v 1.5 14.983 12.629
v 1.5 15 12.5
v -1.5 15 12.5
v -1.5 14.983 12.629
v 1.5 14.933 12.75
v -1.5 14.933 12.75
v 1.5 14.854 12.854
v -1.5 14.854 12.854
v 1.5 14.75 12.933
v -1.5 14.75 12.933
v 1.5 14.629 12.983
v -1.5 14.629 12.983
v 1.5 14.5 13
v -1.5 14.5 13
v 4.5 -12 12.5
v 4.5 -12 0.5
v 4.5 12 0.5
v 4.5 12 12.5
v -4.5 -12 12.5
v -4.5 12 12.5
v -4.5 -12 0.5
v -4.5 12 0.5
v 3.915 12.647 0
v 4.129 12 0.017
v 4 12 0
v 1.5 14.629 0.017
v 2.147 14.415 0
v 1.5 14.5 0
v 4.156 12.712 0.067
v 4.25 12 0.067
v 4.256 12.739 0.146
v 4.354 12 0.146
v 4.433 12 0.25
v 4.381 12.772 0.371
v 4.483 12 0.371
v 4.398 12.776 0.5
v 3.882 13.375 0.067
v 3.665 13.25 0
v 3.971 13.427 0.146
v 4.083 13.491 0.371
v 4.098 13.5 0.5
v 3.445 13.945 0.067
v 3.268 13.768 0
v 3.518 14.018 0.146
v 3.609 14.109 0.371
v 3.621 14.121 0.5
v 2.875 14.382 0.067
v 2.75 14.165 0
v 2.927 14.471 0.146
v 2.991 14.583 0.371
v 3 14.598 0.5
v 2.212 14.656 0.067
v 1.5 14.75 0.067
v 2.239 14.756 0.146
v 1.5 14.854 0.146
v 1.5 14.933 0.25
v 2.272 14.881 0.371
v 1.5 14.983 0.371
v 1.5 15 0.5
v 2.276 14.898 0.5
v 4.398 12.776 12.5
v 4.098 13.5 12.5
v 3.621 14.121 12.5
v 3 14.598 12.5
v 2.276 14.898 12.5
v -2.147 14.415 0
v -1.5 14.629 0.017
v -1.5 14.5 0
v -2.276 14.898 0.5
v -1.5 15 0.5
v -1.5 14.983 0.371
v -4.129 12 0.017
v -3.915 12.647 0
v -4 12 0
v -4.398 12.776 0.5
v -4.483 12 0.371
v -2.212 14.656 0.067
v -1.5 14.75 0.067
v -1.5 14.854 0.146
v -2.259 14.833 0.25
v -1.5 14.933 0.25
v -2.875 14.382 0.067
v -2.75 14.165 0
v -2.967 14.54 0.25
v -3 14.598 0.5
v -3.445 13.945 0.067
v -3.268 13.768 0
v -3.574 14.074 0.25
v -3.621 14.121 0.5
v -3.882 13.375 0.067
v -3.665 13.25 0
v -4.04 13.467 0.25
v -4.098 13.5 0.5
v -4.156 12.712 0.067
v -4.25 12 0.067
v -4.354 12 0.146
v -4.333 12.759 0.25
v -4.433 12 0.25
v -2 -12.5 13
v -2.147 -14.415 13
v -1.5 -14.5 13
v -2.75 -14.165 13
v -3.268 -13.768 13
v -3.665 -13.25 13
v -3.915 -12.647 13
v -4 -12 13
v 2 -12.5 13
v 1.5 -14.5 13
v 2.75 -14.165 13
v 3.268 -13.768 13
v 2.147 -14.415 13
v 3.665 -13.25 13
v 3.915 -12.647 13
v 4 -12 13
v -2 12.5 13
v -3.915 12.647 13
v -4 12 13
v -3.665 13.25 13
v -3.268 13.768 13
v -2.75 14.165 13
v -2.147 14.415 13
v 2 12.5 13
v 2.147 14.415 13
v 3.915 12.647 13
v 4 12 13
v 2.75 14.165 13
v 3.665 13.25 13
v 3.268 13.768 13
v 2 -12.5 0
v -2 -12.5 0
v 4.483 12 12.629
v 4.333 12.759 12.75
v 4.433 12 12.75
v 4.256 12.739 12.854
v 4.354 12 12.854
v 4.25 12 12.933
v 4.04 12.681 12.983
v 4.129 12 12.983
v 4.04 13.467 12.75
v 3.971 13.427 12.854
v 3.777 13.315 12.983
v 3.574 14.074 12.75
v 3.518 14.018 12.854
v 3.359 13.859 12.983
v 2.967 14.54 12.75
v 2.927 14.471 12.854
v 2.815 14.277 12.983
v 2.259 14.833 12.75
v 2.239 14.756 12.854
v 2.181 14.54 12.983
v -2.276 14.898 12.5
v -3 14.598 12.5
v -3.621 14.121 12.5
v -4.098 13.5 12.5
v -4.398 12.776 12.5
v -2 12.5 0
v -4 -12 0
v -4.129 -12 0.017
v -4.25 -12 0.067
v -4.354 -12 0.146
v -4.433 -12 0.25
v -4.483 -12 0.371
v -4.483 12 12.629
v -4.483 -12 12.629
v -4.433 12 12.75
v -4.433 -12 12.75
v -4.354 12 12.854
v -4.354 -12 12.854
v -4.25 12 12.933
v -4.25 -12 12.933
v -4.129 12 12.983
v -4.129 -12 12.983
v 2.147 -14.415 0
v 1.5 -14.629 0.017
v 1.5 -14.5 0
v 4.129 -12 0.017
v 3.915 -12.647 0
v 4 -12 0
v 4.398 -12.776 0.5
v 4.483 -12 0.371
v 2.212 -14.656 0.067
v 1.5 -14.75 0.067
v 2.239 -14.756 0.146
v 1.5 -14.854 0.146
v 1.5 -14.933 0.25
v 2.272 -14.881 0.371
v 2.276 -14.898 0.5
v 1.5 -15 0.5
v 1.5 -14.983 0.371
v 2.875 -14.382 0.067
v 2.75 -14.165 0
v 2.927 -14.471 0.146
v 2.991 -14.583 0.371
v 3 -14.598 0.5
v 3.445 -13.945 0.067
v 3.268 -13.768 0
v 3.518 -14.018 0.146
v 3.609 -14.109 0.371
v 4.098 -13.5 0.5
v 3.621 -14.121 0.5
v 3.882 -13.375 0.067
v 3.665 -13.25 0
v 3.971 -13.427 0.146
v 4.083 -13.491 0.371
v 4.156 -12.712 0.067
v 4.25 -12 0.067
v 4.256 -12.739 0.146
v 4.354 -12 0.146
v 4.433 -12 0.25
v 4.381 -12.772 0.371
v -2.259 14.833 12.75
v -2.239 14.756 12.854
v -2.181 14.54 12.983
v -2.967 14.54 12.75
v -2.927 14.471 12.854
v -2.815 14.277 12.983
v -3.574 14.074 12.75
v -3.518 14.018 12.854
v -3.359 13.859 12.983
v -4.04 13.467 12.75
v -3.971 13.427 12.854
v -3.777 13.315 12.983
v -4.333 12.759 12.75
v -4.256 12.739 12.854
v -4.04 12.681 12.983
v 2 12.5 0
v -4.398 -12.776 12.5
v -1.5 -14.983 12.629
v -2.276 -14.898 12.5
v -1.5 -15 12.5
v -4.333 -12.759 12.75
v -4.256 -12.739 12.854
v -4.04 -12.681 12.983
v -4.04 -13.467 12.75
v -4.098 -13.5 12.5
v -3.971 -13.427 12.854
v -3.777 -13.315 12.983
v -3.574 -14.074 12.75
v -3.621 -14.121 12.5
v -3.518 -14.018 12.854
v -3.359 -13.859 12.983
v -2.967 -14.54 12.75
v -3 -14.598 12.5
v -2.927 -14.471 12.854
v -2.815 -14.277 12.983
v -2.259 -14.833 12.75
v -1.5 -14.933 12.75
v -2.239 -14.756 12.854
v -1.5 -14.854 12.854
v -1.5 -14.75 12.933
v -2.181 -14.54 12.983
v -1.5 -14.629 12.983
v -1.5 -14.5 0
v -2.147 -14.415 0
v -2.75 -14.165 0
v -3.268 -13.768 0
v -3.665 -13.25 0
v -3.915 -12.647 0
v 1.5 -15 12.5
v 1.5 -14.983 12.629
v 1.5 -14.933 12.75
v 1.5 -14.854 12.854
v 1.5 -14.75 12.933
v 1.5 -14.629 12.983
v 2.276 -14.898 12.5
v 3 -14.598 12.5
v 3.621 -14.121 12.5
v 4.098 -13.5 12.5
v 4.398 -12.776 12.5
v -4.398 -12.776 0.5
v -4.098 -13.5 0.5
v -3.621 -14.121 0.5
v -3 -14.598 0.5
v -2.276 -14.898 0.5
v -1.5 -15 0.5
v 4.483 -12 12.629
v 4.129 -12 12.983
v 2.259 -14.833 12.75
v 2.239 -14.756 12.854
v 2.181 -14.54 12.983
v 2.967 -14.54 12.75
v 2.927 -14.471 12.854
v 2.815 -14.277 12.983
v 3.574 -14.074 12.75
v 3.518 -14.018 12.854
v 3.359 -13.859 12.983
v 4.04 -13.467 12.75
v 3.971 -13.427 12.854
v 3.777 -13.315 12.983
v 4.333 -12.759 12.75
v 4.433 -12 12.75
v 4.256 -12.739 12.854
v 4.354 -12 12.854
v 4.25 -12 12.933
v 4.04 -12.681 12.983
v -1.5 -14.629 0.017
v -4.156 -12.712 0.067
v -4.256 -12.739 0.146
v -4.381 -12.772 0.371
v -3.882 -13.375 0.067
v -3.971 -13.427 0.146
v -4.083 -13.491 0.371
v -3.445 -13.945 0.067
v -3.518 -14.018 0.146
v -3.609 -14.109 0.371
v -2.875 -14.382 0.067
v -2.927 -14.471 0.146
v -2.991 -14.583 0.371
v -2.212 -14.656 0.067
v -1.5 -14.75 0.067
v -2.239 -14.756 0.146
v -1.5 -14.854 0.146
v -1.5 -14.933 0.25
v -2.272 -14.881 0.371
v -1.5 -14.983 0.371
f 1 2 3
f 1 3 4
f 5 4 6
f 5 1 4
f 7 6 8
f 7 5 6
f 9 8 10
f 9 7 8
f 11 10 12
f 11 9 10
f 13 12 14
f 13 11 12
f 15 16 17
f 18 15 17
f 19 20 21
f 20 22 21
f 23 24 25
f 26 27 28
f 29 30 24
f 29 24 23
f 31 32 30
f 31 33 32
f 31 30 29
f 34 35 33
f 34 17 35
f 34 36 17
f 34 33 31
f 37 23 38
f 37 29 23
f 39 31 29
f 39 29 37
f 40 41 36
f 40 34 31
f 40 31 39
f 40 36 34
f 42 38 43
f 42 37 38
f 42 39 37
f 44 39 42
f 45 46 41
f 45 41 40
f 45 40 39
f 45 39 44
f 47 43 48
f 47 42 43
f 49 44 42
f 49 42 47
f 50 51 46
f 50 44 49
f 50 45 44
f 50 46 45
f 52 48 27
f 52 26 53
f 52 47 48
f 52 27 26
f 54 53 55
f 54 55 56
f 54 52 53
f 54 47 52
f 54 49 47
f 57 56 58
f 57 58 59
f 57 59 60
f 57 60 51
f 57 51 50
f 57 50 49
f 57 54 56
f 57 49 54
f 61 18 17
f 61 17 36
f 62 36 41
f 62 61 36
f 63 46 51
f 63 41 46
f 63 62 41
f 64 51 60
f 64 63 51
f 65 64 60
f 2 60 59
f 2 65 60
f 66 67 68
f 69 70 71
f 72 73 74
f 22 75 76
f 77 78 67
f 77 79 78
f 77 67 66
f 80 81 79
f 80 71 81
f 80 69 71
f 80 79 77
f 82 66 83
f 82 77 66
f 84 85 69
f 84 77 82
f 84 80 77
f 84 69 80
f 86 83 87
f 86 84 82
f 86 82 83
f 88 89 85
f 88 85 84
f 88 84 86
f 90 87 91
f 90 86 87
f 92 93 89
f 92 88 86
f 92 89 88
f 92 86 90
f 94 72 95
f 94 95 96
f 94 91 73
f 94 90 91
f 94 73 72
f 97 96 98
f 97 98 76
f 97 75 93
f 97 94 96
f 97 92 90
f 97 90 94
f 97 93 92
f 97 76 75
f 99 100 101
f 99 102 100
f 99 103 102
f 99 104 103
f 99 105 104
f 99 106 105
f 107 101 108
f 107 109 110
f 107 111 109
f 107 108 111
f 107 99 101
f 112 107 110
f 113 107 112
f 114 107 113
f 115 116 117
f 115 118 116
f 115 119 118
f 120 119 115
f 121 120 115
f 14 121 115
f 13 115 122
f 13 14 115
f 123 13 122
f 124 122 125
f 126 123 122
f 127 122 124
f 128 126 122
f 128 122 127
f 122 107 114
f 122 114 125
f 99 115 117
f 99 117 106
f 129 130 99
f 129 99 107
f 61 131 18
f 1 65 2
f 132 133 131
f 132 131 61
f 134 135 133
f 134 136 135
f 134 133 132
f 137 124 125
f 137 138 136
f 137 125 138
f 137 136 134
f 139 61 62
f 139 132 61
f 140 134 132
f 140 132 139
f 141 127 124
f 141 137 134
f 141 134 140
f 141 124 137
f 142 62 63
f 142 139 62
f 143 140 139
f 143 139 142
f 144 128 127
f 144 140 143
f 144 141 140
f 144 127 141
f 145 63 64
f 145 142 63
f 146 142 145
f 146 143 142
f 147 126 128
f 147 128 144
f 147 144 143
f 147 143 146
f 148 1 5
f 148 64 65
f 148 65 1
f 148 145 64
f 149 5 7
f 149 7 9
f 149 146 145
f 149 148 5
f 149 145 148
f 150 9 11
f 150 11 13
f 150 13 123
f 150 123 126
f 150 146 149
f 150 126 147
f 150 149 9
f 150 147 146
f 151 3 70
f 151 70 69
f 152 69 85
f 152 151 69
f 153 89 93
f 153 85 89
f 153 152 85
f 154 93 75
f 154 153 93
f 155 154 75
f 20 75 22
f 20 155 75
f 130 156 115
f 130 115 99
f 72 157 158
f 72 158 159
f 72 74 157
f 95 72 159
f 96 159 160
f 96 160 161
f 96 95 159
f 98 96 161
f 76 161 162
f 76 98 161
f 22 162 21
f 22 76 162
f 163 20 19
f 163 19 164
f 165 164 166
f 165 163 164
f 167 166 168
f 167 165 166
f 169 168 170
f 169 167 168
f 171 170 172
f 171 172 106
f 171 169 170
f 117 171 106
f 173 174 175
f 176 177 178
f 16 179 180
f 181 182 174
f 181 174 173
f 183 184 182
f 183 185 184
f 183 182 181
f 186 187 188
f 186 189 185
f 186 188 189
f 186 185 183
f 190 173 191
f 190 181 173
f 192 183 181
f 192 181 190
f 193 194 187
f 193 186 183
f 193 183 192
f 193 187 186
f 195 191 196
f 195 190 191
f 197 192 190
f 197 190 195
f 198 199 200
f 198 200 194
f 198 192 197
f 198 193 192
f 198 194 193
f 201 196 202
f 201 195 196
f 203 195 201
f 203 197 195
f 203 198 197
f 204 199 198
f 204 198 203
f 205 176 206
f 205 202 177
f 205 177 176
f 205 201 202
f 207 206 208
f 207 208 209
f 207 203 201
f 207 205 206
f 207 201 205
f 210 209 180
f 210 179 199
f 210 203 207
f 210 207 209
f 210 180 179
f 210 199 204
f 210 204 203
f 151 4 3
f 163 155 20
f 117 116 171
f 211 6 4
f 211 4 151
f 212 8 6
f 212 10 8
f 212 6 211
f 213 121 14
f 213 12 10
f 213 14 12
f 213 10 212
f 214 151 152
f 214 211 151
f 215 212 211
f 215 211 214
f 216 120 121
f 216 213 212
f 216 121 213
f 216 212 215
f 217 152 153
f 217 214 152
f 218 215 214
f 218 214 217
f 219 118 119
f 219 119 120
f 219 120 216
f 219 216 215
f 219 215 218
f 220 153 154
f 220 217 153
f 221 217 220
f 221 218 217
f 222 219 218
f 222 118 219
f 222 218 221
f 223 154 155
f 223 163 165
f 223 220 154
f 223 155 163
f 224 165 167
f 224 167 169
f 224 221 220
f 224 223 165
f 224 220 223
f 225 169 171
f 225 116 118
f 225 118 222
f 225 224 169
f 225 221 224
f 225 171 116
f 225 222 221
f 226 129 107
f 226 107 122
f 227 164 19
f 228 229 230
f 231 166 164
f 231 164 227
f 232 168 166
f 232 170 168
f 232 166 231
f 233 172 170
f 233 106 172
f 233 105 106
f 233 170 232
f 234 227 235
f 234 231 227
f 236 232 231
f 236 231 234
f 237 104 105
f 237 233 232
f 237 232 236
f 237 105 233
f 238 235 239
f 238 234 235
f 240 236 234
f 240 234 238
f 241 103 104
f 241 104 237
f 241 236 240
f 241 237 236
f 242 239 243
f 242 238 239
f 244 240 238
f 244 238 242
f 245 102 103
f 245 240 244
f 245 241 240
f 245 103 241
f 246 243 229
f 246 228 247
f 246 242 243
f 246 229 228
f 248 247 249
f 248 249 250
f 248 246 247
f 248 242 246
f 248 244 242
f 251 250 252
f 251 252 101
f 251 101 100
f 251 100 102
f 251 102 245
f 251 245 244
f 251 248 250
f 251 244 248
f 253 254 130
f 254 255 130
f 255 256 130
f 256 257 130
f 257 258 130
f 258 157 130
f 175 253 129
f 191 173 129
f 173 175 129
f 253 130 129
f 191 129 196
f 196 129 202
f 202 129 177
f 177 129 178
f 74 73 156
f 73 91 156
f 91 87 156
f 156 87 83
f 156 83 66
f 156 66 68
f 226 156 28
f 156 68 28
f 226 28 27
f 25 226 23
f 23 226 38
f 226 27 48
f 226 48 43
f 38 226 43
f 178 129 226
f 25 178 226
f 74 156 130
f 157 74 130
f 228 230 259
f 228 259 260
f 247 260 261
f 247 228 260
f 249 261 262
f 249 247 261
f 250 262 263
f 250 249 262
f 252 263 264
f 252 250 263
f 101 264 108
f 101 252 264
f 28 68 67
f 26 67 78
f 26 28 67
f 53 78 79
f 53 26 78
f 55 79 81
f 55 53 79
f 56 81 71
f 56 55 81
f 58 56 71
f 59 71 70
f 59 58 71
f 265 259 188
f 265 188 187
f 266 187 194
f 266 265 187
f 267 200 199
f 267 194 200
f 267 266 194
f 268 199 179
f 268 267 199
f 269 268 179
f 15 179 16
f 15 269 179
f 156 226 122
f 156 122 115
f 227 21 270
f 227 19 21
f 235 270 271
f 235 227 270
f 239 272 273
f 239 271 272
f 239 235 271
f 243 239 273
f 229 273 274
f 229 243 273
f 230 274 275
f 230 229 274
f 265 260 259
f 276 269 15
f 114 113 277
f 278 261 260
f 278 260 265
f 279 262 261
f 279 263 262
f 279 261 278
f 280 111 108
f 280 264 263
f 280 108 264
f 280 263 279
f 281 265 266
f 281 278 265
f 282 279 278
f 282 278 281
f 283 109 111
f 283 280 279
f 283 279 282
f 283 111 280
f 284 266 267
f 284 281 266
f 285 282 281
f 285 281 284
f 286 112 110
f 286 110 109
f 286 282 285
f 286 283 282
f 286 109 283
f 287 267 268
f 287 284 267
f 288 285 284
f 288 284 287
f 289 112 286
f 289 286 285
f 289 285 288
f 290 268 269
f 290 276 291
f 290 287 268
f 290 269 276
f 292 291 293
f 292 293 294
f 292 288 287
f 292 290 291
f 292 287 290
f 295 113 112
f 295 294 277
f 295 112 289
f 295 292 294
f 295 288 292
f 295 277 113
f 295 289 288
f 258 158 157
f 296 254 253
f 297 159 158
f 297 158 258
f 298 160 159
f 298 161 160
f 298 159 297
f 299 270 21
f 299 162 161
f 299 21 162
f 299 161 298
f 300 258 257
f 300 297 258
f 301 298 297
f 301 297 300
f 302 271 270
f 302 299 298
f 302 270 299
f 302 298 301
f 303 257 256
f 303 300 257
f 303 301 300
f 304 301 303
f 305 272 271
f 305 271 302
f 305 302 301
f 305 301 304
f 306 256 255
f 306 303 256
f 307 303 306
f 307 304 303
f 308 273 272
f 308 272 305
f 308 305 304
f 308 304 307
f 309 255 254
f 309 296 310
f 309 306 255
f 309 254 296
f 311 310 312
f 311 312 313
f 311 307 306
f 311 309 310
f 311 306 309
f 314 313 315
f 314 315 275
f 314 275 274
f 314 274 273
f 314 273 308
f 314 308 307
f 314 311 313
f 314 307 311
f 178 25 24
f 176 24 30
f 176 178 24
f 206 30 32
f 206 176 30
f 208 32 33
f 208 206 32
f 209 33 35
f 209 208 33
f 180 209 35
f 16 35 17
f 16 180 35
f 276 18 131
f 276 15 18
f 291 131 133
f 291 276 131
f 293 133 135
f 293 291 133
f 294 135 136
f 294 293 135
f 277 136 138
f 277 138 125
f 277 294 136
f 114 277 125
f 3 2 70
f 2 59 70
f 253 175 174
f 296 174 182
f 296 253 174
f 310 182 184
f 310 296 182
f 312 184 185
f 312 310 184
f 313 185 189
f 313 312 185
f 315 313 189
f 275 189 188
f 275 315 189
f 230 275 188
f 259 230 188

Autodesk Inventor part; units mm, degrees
ref_plane "YZ Plane" through (0, 0, 0) normal (1, 0, 0) x (0, 1, 0)
ref_plane "XZ Plane" through (0, 0, 0) normal (0, 1, 0) x (-1, 0, 0)
ref_plane "XY Plane" through (0, 0, 0) normal (0, 0, 1) x (1, 0, 0)
sketch "Sketch1" plane through (0, 0, 0) normal (0, 0, 1) x (1, 0, 0)
  line L0 (-2, -12.5) -> (2, -12.5)
  line L1 (2, -12.5) -> (2, 12.5)
  line L2 (2, 12.5) -> (-2, 12.5)
  line L3 (-2, 12.5) -> (-2, -12.5)
  line L4 (-2, -12.5) -> (2, 12.5) construction
  line L5 (2, -12.5) -> (-2, 12.5) construction
  line L6 (-4.5, -15) -> (4.5, -15)
  line L7 (4.5, -15) -> (4.5, 15)
  line L8 (4.5, 15) -> (-4.5, 15)
  line L9 (-4.5, 15) -> (-4.5, -15)
  line L10 (-4.5, -15) -> (4.5, 15) construction
  line L11 (4.5, -15) -> (-4.5, 15) construction
  point P0 (0, 0)
  dimension "d0" = 4
  dimension "d1" = 25
  dimension "d2" = 9
  dimension "d3" = 30
extrude "Extrusion1" add sketch "Sketch1" along normal blind 13
fillet "Fillet1" radius 3 4 edges at (-4.5, 15, 6.5) (4.5, 15, 6.5) (4.5, -15, 6.5) (-4.5, -15, 6.5)
fillet "Fillet2" radius 0.5 16 edges at (-3.6213, 14.1213, 13) (-4.5, 0, 13) (-3.6213, -14.1213, 13) (0, -15, 13) (3.6213, -14.1213, 13) (4.5, 0, 13) (3.6213, 14.1213, 13) (0, 15, 13) (-3.6213, 14.1213, 0) (-4.5, 0, 0) (-3.6213, -14.1213, 0) (0, -15, 0) (3.6213, -14.1213, 0) (4.5, 0, 0) (3.6213, 14.1213, 0) (0, 15, 0)
properties part number "copper-wire"
